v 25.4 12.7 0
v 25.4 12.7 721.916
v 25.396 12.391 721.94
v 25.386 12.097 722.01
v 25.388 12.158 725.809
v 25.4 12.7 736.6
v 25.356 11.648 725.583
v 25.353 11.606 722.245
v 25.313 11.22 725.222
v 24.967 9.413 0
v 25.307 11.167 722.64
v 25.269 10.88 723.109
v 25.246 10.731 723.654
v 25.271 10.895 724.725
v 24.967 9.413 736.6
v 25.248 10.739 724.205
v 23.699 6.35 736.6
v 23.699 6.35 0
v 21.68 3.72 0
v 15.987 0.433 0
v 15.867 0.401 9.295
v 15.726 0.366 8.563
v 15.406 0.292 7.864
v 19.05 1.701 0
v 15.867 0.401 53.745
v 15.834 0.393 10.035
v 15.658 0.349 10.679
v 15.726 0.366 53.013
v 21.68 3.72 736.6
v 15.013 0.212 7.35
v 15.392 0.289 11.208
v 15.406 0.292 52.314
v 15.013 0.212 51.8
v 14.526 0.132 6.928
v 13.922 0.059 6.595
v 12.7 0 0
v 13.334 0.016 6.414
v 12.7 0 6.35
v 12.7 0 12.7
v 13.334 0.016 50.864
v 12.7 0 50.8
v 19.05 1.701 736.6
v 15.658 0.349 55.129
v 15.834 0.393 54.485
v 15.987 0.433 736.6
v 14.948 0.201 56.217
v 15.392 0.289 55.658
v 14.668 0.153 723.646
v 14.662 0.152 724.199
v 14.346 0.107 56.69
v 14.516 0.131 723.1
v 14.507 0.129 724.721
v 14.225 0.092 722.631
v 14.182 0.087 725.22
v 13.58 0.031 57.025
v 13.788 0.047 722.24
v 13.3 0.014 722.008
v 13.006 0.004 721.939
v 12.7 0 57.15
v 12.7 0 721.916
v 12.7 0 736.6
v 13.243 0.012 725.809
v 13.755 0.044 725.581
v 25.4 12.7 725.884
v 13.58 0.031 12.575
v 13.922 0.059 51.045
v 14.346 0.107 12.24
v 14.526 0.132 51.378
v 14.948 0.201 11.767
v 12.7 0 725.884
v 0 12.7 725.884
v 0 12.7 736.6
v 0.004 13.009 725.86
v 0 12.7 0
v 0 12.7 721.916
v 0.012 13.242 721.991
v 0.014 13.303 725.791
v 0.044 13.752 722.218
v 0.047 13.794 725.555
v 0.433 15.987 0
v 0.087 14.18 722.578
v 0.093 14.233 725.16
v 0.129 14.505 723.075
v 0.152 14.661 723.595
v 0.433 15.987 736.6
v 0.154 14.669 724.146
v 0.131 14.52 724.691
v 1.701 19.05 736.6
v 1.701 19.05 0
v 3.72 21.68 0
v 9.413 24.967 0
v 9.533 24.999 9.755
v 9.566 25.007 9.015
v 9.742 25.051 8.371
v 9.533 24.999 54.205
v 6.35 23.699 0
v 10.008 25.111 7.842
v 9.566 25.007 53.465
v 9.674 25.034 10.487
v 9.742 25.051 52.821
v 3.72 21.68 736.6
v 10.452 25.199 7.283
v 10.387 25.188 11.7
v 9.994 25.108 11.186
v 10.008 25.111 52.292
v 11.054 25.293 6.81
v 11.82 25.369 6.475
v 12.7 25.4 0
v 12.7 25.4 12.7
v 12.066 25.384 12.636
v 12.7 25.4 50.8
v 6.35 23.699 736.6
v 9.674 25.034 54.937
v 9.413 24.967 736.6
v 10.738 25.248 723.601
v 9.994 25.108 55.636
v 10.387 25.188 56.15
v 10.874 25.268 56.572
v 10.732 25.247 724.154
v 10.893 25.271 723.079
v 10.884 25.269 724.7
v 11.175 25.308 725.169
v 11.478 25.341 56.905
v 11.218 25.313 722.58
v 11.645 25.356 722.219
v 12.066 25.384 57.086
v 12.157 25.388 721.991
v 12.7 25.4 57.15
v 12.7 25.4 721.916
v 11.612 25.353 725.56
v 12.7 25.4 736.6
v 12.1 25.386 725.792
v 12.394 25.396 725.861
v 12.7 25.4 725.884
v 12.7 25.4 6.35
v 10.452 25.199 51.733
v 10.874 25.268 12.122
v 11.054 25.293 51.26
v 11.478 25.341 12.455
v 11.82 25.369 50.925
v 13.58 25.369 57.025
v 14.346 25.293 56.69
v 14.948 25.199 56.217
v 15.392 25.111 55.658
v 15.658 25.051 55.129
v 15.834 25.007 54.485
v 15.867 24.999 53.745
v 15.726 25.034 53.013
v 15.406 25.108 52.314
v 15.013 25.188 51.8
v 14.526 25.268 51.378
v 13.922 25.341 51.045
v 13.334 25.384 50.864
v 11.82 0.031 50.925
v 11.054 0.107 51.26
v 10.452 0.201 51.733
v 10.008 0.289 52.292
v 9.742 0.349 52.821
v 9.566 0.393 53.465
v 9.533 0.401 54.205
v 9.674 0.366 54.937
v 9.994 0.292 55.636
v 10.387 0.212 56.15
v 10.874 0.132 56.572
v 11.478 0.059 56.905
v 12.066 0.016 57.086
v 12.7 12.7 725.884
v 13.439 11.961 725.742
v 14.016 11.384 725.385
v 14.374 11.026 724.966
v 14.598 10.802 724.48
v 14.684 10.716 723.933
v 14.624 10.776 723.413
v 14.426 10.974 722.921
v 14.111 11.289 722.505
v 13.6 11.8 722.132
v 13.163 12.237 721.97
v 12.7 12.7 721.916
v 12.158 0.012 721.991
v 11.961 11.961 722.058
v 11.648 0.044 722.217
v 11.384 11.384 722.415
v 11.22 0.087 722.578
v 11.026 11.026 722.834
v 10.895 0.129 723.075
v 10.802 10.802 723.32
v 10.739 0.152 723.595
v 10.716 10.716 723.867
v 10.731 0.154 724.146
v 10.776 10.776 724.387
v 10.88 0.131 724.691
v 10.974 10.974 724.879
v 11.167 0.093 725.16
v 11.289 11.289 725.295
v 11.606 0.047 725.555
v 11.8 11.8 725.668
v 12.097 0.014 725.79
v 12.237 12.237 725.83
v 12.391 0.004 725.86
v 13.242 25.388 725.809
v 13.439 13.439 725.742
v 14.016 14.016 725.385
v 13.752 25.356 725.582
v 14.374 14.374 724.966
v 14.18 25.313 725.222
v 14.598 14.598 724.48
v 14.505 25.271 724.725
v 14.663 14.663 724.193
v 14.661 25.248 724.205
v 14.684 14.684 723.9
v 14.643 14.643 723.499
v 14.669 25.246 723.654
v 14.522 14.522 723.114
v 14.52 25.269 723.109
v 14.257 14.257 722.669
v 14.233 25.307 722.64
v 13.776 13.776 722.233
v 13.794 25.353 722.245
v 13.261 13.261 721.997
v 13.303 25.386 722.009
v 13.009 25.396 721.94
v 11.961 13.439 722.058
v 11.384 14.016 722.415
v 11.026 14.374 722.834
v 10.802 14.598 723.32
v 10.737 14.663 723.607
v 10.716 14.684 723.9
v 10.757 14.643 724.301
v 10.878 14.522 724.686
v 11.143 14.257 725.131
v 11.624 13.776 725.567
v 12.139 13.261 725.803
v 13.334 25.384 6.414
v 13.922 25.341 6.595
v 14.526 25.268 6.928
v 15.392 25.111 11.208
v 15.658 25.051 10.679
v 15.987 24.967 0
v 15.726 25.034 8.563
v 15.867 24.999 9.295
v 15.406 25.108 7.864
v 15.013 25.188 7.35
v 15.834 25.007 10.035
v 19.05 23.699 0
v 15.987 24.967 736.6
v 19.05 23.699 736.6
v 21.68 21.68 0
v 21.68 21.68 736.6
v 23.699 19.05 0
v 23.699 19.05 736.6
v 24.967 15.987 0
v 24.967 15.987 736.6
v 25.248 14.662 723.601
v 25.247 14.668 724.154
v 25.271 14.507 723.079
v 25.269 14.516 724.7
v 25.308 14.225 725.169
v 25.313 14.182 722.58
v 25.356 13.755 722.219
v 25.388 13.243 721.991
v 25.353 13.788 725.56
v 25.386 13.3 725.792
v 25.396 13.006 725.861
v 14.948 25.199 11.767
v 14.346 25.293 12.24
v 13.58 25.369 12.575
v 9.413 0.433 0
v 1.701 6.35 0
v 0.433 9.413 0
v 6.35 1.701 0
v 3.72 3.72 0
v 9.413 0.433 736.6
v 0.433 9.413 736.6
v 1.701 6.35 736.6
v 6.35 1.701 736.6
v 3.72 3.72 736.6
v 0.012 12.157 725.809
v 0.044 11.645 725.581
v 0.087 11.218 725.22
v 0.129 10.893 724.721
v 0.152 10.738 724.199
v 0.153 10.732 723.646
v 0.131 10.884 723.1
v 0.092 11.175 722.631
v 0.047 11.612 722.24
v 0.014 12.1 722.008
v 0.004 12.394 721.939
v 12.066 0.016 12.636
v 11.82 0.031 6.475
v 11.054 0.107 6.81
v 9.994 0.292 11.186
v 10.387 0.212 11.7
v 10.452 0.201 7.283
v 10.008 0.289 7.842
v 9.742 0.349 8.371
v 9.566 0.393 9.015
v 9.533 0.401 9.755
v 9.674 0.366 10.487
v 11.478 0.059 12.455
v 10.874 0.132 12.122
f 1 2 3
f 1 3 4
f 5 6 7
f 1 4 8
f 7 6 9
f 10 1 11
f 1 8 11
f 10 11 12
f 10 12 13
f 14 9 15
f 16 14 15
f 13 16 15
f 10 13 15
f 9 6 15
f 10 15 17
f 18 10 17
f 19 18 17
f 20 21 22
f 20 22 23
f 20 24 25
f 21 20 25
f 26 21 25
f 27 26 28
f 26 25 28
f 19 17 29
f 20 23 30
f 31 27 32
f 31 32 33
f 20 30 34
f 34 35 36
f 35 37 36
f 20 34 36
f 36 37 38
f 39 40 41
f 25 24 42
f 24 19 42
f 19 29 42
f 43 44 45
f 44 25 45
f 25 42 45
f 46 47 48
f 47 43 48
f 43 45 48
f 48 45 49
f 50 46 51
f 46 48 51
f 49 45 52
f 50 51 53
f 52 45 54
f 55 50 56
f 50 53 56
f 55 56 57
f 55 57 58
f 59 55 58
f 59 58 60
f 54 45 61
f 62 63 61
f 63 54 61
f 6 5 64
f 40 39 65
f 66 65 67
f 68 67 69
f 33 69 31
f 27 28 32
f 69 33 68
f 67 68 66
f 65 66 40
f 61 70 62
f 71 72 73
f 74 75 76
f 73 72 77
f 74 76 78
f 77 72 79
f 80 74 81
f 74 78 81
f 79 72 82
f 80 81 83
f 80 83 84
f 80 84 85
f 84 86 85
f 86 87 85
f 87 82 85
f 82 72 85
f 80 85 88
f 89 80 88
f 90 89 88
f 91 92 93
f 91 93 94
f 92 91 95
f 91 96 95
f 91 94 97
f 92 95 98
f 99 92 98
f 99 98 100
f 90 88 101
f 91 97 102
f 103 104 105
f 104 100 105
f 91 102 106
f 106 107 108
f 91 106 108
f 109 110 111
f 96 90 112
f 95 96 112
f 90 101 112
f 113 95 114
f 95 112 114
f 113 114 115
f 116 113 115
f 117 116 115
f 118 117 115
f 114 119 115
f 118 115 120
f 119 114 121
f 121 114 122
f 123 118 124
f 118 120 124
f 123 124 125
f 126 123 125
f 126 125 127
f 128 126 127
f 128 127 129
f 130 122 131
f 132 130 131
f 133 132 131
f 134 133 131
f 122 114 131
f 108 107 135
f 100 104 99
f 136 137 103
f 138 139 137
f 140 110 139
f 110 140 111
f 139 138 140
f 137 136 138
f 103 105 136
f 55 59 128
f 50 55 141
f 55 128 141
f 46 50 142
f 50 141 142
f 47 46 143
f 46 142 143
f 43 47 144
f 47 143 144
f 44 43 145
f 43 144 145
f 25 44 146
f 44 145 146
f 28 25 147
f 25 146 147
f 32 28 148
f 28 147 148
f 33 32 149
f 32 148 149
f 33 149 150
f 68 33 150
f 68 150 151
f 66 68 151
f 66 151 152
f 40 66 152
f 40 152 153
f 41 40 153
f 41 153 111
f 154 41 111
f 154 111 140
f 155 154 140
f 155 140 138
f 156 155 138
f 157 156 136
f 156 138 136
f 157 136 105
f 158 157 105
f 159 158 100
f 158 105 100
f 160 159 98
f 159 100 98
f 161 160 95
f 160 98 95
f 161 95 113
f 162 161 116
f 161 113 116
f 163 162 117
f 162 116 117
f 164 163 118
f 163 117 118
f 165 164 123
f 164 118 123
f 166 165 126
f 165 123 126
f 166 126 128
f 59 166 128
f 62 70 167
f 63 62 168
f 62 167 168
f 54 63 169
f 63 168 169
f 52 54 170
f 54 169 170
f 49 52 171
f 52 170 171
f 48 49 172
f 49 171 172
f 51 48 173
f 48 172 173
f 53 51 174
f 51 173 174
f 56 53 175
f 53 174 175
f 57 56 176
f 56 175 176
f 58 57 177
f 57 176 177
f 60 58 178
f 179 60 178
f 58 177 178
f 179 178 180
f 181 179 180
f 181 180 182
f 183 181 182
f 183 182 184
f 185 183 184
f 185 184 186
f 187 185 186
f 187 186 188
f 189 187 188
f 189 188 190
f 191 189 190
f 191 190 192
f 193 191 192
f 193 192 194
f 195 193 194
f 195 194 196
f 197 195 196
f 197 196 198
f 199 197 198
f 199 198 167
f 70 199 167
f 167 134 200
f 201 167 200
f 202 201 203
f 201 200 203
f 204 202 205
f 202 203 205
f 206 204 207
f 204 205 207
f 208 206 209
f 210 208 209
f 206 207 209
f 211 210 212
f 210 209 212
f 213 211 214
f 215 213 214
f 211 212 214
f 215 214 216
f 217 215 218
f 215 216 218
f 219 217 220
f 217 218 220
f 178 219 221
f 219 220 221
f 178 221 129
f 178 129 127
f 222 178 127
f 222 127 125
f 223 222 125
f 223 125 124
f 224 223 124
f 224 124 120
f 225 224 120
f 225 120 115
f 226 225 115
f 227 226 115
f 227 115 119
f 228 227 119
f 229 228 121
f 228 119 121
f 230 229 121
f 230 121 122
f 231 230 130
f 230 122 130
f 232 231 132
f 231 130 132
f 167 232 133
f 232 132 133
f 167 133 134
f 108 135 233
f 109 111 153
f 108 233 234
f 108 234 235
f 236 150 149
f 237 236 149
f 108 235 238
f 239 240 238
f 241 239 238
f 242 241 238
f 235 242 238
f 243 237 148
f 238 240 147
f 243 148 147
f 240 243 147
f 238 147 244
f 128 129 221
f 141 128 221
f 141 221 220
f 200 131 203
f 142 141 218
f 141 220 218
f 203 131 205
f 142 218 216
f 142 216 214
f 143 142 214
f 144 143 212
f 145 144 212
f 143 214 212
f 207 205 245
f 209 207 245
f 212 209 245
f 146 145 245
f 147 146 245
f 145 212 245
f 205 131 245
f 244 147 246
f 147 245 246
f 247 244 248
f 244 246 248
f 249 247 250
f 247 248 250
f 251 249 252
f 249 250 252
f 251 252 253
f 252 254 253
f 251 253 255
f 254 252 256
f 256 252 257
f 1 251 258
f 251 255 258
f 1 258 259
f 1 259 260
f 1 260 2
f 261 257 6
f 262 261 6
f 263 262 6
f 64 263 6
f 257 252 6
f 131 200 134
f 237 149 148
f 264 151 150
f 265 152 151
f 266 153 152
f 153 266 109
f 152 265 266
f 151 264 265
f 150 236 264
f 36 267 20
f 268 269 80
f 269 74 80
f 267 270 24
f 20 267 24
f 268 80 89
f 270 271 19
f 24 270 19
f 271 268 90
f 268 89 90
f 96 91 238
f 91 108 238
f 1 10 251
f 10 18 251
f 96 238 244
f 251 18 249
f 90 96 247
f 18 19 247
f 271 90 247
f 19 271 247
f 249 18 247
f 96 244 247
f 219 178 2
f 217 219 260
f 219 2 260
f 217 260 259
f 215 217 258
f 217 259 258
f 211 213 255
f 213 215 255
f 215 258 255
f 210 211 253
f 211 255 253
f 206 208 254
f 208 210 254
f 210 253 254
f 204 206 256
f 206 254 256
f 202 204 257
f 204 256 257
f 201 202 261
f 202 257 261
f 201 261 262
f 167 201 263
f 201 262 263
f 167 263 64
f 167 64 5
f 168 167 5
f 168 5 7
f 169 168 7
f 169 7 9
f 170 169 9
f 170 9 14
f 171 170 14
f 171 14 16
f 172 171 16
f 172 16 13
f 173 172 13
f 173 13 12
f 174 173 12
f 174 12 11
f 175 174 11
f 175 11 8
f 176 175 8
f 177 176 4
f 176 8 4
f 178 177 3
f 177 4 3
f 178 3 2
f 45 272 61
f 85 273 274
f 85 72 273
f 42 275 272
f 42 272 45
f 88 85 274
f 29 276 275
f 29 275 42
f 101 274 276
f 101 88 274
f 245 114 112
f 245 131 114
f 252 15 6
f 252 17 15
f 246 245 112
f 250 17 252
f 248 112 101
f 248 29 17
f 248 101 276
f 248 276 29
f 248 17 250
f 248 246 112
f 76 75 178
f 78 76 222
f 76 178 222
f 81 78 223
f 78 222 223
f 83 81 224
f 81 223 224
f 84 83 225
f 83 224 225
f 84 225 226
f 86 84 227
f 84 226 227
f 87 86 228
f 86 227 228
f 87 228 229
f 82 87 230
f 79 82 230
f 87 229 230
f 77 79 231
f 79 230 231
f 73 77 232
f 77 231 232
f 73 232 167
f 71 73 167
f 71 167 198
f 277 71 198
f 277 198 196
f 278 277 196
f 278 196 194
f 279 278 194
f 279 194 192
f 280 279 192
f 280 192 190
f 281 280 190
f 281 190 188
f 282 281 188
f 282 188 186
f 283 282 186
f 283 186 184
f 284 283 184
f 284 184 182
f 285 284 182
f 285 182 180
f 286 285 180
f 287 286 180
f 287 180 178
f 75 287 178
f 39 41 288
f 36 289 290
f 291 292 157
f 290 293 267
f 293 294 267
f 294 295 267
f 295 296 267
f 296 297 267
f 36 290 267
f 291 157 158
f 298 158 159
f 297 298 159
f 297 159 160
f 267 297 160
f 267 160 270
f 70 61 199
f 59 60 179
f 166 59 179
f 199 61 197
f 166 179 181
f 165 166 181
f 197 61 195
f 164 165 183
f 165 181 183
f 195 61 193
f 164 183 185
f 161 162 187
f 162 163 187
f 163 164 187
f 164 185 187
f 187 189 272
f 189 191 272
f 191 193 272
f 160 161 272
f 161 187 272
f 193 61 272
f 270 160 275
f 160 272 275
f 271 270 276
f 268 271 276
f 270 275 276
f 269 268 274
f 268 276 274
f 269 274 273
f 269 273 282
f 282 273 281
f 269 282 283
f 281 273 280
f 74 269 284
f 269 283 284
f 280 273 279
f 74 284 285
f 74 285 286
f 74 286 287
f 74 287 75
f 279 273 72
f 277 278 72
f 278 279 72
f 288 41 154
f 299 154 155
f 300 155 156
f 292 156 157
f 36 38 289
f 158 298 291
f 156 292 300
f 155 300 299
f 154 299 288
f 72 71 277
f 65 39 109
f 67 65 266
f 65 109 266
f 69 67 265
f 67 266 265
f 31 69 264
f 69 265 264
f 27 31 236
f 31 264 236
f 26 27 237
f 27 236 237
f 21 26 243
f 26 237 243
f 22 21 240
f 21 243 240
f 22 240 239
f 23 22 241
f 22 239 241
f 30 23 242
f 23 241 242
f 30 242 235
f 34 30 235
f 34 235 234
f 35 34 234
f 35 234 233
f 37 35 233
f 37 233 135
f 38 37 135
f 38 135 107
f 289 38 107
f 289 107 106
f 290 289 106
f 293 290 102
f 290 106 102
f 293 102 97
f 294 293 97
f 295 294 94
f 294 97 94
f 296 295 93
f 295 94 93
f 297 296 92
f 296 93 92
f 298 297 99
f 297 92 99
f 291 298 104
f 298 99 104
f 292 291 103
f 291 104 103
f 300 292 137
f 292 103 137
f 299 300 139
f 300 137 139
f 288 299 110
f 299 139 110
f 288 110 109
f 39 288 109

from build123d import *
from build123d.topology import SkipClean

# Parameters (mm, degrees)
SKETCH2_W           = 25.4
SKETCH2_H           = 25.4
BOSS_EXTRUDE1_DEPTH = 736.6
SKETCH4_R           = 3.175
SKETCH4_R_2         = 1.984375
CUT_EXTRUDE1_DEPTH  = 736.6
SKETCH5_R           = 1.984375
CUT_EXTRUDE2_DEPTH  = 736.6
CUT_EXTRUDE3_DEPTH  = 736.6


with BuildPart() as part:
    # Sketch2 → Boss-Extrude1 (new body)
    with BuildSketch(Plane.XY):
        with Locations((12.7, 12.7)):
            Rectangle(SKETCH2_W, SKETCH2_H)
    extrude(amount=BOSS_EXTRUDE1_DEPTH)

    # Sketch4 → Cut-Extrude1 (cut)
    with BuildSketch(Plane(origin=(0, 25.4, 0), x_dir=(1, 0, 0), z_dir=(0, 1, 0))):
        with Locations(Location((12.7, -9.525, 0), (0, 0, 270))):
            Circle(SKETCH4_R)
        with Locations(Location((12.7, -53.975, 0), (0, 0, 270))):
            Circle(SKETCH4_R)
        with Locations(Location((12.7, -723.9, 0), (0, 0, 270))):
            Circle(SKETCH4_R_2)
    extrude(amount=-CUT_EXTRUDE1_DEPTH, mode=Mode.SUBTRACT)

    # Sketch5 → Cut-Extrude2 (cut)
    with BuildSketch(Plane(origin=(25.4, 0, 0), x_dir=(0, 0, -1), z_dir=(1, 0, 0))):
        with Locations((-723.9, 12.7)):
            Circle(SKETCH5_R)
    extrude(amount=-CUT_EXTRUDE2_DEPTH, mode=Mode.SUBTRACT)

    # Sketch6 → Cut-Extrude3 (cut)
    with SkipClean():  # the faces are left unmerged after this step: merging them gives an invalid solid
        with BuildSketch(Plane.XY.offset(736.6)):
            with BuildLine():
                Line((0, 25.4), (0, 12.7))
                ThreePointArc((0, 12.7), (3.719743879, 21.680256121), (12.7, 25.4))
                Line((12.7, 25.4), (0, 25.4))
            make_face()
            with BuildLine():
                ThreePointArc((12.7, 25.4), (21.680256121, 21.680256121), (25.4, 12.7))
                Line((25.4, 12.7), (25.4, 25.4))
                Line((25.4, 25.4), (12.7, 25.4))
            make_face()
            with BuildLine():
                Line((25.4, 0), (25.4, 12.7))
                ThreePointArc((25.4, 12.7), (21.680256121, 3.719743879), (12.7, 0))
                Line((12.7, 0), (25.4, 0))
            make_face()
            with BuildLine():
                ThreePointArc((12.7, 0), (3.719743879, 3.719743879), (0, 12.7))
                Line((0, 12.7), (0, 0))
                Line((0, 0), (12.7, 0))
            make_face()
        extrude(amount=-CUT_EXTRUDE3_DEPTH, mode=Mode.SUBTRACT)


solid = part.part
